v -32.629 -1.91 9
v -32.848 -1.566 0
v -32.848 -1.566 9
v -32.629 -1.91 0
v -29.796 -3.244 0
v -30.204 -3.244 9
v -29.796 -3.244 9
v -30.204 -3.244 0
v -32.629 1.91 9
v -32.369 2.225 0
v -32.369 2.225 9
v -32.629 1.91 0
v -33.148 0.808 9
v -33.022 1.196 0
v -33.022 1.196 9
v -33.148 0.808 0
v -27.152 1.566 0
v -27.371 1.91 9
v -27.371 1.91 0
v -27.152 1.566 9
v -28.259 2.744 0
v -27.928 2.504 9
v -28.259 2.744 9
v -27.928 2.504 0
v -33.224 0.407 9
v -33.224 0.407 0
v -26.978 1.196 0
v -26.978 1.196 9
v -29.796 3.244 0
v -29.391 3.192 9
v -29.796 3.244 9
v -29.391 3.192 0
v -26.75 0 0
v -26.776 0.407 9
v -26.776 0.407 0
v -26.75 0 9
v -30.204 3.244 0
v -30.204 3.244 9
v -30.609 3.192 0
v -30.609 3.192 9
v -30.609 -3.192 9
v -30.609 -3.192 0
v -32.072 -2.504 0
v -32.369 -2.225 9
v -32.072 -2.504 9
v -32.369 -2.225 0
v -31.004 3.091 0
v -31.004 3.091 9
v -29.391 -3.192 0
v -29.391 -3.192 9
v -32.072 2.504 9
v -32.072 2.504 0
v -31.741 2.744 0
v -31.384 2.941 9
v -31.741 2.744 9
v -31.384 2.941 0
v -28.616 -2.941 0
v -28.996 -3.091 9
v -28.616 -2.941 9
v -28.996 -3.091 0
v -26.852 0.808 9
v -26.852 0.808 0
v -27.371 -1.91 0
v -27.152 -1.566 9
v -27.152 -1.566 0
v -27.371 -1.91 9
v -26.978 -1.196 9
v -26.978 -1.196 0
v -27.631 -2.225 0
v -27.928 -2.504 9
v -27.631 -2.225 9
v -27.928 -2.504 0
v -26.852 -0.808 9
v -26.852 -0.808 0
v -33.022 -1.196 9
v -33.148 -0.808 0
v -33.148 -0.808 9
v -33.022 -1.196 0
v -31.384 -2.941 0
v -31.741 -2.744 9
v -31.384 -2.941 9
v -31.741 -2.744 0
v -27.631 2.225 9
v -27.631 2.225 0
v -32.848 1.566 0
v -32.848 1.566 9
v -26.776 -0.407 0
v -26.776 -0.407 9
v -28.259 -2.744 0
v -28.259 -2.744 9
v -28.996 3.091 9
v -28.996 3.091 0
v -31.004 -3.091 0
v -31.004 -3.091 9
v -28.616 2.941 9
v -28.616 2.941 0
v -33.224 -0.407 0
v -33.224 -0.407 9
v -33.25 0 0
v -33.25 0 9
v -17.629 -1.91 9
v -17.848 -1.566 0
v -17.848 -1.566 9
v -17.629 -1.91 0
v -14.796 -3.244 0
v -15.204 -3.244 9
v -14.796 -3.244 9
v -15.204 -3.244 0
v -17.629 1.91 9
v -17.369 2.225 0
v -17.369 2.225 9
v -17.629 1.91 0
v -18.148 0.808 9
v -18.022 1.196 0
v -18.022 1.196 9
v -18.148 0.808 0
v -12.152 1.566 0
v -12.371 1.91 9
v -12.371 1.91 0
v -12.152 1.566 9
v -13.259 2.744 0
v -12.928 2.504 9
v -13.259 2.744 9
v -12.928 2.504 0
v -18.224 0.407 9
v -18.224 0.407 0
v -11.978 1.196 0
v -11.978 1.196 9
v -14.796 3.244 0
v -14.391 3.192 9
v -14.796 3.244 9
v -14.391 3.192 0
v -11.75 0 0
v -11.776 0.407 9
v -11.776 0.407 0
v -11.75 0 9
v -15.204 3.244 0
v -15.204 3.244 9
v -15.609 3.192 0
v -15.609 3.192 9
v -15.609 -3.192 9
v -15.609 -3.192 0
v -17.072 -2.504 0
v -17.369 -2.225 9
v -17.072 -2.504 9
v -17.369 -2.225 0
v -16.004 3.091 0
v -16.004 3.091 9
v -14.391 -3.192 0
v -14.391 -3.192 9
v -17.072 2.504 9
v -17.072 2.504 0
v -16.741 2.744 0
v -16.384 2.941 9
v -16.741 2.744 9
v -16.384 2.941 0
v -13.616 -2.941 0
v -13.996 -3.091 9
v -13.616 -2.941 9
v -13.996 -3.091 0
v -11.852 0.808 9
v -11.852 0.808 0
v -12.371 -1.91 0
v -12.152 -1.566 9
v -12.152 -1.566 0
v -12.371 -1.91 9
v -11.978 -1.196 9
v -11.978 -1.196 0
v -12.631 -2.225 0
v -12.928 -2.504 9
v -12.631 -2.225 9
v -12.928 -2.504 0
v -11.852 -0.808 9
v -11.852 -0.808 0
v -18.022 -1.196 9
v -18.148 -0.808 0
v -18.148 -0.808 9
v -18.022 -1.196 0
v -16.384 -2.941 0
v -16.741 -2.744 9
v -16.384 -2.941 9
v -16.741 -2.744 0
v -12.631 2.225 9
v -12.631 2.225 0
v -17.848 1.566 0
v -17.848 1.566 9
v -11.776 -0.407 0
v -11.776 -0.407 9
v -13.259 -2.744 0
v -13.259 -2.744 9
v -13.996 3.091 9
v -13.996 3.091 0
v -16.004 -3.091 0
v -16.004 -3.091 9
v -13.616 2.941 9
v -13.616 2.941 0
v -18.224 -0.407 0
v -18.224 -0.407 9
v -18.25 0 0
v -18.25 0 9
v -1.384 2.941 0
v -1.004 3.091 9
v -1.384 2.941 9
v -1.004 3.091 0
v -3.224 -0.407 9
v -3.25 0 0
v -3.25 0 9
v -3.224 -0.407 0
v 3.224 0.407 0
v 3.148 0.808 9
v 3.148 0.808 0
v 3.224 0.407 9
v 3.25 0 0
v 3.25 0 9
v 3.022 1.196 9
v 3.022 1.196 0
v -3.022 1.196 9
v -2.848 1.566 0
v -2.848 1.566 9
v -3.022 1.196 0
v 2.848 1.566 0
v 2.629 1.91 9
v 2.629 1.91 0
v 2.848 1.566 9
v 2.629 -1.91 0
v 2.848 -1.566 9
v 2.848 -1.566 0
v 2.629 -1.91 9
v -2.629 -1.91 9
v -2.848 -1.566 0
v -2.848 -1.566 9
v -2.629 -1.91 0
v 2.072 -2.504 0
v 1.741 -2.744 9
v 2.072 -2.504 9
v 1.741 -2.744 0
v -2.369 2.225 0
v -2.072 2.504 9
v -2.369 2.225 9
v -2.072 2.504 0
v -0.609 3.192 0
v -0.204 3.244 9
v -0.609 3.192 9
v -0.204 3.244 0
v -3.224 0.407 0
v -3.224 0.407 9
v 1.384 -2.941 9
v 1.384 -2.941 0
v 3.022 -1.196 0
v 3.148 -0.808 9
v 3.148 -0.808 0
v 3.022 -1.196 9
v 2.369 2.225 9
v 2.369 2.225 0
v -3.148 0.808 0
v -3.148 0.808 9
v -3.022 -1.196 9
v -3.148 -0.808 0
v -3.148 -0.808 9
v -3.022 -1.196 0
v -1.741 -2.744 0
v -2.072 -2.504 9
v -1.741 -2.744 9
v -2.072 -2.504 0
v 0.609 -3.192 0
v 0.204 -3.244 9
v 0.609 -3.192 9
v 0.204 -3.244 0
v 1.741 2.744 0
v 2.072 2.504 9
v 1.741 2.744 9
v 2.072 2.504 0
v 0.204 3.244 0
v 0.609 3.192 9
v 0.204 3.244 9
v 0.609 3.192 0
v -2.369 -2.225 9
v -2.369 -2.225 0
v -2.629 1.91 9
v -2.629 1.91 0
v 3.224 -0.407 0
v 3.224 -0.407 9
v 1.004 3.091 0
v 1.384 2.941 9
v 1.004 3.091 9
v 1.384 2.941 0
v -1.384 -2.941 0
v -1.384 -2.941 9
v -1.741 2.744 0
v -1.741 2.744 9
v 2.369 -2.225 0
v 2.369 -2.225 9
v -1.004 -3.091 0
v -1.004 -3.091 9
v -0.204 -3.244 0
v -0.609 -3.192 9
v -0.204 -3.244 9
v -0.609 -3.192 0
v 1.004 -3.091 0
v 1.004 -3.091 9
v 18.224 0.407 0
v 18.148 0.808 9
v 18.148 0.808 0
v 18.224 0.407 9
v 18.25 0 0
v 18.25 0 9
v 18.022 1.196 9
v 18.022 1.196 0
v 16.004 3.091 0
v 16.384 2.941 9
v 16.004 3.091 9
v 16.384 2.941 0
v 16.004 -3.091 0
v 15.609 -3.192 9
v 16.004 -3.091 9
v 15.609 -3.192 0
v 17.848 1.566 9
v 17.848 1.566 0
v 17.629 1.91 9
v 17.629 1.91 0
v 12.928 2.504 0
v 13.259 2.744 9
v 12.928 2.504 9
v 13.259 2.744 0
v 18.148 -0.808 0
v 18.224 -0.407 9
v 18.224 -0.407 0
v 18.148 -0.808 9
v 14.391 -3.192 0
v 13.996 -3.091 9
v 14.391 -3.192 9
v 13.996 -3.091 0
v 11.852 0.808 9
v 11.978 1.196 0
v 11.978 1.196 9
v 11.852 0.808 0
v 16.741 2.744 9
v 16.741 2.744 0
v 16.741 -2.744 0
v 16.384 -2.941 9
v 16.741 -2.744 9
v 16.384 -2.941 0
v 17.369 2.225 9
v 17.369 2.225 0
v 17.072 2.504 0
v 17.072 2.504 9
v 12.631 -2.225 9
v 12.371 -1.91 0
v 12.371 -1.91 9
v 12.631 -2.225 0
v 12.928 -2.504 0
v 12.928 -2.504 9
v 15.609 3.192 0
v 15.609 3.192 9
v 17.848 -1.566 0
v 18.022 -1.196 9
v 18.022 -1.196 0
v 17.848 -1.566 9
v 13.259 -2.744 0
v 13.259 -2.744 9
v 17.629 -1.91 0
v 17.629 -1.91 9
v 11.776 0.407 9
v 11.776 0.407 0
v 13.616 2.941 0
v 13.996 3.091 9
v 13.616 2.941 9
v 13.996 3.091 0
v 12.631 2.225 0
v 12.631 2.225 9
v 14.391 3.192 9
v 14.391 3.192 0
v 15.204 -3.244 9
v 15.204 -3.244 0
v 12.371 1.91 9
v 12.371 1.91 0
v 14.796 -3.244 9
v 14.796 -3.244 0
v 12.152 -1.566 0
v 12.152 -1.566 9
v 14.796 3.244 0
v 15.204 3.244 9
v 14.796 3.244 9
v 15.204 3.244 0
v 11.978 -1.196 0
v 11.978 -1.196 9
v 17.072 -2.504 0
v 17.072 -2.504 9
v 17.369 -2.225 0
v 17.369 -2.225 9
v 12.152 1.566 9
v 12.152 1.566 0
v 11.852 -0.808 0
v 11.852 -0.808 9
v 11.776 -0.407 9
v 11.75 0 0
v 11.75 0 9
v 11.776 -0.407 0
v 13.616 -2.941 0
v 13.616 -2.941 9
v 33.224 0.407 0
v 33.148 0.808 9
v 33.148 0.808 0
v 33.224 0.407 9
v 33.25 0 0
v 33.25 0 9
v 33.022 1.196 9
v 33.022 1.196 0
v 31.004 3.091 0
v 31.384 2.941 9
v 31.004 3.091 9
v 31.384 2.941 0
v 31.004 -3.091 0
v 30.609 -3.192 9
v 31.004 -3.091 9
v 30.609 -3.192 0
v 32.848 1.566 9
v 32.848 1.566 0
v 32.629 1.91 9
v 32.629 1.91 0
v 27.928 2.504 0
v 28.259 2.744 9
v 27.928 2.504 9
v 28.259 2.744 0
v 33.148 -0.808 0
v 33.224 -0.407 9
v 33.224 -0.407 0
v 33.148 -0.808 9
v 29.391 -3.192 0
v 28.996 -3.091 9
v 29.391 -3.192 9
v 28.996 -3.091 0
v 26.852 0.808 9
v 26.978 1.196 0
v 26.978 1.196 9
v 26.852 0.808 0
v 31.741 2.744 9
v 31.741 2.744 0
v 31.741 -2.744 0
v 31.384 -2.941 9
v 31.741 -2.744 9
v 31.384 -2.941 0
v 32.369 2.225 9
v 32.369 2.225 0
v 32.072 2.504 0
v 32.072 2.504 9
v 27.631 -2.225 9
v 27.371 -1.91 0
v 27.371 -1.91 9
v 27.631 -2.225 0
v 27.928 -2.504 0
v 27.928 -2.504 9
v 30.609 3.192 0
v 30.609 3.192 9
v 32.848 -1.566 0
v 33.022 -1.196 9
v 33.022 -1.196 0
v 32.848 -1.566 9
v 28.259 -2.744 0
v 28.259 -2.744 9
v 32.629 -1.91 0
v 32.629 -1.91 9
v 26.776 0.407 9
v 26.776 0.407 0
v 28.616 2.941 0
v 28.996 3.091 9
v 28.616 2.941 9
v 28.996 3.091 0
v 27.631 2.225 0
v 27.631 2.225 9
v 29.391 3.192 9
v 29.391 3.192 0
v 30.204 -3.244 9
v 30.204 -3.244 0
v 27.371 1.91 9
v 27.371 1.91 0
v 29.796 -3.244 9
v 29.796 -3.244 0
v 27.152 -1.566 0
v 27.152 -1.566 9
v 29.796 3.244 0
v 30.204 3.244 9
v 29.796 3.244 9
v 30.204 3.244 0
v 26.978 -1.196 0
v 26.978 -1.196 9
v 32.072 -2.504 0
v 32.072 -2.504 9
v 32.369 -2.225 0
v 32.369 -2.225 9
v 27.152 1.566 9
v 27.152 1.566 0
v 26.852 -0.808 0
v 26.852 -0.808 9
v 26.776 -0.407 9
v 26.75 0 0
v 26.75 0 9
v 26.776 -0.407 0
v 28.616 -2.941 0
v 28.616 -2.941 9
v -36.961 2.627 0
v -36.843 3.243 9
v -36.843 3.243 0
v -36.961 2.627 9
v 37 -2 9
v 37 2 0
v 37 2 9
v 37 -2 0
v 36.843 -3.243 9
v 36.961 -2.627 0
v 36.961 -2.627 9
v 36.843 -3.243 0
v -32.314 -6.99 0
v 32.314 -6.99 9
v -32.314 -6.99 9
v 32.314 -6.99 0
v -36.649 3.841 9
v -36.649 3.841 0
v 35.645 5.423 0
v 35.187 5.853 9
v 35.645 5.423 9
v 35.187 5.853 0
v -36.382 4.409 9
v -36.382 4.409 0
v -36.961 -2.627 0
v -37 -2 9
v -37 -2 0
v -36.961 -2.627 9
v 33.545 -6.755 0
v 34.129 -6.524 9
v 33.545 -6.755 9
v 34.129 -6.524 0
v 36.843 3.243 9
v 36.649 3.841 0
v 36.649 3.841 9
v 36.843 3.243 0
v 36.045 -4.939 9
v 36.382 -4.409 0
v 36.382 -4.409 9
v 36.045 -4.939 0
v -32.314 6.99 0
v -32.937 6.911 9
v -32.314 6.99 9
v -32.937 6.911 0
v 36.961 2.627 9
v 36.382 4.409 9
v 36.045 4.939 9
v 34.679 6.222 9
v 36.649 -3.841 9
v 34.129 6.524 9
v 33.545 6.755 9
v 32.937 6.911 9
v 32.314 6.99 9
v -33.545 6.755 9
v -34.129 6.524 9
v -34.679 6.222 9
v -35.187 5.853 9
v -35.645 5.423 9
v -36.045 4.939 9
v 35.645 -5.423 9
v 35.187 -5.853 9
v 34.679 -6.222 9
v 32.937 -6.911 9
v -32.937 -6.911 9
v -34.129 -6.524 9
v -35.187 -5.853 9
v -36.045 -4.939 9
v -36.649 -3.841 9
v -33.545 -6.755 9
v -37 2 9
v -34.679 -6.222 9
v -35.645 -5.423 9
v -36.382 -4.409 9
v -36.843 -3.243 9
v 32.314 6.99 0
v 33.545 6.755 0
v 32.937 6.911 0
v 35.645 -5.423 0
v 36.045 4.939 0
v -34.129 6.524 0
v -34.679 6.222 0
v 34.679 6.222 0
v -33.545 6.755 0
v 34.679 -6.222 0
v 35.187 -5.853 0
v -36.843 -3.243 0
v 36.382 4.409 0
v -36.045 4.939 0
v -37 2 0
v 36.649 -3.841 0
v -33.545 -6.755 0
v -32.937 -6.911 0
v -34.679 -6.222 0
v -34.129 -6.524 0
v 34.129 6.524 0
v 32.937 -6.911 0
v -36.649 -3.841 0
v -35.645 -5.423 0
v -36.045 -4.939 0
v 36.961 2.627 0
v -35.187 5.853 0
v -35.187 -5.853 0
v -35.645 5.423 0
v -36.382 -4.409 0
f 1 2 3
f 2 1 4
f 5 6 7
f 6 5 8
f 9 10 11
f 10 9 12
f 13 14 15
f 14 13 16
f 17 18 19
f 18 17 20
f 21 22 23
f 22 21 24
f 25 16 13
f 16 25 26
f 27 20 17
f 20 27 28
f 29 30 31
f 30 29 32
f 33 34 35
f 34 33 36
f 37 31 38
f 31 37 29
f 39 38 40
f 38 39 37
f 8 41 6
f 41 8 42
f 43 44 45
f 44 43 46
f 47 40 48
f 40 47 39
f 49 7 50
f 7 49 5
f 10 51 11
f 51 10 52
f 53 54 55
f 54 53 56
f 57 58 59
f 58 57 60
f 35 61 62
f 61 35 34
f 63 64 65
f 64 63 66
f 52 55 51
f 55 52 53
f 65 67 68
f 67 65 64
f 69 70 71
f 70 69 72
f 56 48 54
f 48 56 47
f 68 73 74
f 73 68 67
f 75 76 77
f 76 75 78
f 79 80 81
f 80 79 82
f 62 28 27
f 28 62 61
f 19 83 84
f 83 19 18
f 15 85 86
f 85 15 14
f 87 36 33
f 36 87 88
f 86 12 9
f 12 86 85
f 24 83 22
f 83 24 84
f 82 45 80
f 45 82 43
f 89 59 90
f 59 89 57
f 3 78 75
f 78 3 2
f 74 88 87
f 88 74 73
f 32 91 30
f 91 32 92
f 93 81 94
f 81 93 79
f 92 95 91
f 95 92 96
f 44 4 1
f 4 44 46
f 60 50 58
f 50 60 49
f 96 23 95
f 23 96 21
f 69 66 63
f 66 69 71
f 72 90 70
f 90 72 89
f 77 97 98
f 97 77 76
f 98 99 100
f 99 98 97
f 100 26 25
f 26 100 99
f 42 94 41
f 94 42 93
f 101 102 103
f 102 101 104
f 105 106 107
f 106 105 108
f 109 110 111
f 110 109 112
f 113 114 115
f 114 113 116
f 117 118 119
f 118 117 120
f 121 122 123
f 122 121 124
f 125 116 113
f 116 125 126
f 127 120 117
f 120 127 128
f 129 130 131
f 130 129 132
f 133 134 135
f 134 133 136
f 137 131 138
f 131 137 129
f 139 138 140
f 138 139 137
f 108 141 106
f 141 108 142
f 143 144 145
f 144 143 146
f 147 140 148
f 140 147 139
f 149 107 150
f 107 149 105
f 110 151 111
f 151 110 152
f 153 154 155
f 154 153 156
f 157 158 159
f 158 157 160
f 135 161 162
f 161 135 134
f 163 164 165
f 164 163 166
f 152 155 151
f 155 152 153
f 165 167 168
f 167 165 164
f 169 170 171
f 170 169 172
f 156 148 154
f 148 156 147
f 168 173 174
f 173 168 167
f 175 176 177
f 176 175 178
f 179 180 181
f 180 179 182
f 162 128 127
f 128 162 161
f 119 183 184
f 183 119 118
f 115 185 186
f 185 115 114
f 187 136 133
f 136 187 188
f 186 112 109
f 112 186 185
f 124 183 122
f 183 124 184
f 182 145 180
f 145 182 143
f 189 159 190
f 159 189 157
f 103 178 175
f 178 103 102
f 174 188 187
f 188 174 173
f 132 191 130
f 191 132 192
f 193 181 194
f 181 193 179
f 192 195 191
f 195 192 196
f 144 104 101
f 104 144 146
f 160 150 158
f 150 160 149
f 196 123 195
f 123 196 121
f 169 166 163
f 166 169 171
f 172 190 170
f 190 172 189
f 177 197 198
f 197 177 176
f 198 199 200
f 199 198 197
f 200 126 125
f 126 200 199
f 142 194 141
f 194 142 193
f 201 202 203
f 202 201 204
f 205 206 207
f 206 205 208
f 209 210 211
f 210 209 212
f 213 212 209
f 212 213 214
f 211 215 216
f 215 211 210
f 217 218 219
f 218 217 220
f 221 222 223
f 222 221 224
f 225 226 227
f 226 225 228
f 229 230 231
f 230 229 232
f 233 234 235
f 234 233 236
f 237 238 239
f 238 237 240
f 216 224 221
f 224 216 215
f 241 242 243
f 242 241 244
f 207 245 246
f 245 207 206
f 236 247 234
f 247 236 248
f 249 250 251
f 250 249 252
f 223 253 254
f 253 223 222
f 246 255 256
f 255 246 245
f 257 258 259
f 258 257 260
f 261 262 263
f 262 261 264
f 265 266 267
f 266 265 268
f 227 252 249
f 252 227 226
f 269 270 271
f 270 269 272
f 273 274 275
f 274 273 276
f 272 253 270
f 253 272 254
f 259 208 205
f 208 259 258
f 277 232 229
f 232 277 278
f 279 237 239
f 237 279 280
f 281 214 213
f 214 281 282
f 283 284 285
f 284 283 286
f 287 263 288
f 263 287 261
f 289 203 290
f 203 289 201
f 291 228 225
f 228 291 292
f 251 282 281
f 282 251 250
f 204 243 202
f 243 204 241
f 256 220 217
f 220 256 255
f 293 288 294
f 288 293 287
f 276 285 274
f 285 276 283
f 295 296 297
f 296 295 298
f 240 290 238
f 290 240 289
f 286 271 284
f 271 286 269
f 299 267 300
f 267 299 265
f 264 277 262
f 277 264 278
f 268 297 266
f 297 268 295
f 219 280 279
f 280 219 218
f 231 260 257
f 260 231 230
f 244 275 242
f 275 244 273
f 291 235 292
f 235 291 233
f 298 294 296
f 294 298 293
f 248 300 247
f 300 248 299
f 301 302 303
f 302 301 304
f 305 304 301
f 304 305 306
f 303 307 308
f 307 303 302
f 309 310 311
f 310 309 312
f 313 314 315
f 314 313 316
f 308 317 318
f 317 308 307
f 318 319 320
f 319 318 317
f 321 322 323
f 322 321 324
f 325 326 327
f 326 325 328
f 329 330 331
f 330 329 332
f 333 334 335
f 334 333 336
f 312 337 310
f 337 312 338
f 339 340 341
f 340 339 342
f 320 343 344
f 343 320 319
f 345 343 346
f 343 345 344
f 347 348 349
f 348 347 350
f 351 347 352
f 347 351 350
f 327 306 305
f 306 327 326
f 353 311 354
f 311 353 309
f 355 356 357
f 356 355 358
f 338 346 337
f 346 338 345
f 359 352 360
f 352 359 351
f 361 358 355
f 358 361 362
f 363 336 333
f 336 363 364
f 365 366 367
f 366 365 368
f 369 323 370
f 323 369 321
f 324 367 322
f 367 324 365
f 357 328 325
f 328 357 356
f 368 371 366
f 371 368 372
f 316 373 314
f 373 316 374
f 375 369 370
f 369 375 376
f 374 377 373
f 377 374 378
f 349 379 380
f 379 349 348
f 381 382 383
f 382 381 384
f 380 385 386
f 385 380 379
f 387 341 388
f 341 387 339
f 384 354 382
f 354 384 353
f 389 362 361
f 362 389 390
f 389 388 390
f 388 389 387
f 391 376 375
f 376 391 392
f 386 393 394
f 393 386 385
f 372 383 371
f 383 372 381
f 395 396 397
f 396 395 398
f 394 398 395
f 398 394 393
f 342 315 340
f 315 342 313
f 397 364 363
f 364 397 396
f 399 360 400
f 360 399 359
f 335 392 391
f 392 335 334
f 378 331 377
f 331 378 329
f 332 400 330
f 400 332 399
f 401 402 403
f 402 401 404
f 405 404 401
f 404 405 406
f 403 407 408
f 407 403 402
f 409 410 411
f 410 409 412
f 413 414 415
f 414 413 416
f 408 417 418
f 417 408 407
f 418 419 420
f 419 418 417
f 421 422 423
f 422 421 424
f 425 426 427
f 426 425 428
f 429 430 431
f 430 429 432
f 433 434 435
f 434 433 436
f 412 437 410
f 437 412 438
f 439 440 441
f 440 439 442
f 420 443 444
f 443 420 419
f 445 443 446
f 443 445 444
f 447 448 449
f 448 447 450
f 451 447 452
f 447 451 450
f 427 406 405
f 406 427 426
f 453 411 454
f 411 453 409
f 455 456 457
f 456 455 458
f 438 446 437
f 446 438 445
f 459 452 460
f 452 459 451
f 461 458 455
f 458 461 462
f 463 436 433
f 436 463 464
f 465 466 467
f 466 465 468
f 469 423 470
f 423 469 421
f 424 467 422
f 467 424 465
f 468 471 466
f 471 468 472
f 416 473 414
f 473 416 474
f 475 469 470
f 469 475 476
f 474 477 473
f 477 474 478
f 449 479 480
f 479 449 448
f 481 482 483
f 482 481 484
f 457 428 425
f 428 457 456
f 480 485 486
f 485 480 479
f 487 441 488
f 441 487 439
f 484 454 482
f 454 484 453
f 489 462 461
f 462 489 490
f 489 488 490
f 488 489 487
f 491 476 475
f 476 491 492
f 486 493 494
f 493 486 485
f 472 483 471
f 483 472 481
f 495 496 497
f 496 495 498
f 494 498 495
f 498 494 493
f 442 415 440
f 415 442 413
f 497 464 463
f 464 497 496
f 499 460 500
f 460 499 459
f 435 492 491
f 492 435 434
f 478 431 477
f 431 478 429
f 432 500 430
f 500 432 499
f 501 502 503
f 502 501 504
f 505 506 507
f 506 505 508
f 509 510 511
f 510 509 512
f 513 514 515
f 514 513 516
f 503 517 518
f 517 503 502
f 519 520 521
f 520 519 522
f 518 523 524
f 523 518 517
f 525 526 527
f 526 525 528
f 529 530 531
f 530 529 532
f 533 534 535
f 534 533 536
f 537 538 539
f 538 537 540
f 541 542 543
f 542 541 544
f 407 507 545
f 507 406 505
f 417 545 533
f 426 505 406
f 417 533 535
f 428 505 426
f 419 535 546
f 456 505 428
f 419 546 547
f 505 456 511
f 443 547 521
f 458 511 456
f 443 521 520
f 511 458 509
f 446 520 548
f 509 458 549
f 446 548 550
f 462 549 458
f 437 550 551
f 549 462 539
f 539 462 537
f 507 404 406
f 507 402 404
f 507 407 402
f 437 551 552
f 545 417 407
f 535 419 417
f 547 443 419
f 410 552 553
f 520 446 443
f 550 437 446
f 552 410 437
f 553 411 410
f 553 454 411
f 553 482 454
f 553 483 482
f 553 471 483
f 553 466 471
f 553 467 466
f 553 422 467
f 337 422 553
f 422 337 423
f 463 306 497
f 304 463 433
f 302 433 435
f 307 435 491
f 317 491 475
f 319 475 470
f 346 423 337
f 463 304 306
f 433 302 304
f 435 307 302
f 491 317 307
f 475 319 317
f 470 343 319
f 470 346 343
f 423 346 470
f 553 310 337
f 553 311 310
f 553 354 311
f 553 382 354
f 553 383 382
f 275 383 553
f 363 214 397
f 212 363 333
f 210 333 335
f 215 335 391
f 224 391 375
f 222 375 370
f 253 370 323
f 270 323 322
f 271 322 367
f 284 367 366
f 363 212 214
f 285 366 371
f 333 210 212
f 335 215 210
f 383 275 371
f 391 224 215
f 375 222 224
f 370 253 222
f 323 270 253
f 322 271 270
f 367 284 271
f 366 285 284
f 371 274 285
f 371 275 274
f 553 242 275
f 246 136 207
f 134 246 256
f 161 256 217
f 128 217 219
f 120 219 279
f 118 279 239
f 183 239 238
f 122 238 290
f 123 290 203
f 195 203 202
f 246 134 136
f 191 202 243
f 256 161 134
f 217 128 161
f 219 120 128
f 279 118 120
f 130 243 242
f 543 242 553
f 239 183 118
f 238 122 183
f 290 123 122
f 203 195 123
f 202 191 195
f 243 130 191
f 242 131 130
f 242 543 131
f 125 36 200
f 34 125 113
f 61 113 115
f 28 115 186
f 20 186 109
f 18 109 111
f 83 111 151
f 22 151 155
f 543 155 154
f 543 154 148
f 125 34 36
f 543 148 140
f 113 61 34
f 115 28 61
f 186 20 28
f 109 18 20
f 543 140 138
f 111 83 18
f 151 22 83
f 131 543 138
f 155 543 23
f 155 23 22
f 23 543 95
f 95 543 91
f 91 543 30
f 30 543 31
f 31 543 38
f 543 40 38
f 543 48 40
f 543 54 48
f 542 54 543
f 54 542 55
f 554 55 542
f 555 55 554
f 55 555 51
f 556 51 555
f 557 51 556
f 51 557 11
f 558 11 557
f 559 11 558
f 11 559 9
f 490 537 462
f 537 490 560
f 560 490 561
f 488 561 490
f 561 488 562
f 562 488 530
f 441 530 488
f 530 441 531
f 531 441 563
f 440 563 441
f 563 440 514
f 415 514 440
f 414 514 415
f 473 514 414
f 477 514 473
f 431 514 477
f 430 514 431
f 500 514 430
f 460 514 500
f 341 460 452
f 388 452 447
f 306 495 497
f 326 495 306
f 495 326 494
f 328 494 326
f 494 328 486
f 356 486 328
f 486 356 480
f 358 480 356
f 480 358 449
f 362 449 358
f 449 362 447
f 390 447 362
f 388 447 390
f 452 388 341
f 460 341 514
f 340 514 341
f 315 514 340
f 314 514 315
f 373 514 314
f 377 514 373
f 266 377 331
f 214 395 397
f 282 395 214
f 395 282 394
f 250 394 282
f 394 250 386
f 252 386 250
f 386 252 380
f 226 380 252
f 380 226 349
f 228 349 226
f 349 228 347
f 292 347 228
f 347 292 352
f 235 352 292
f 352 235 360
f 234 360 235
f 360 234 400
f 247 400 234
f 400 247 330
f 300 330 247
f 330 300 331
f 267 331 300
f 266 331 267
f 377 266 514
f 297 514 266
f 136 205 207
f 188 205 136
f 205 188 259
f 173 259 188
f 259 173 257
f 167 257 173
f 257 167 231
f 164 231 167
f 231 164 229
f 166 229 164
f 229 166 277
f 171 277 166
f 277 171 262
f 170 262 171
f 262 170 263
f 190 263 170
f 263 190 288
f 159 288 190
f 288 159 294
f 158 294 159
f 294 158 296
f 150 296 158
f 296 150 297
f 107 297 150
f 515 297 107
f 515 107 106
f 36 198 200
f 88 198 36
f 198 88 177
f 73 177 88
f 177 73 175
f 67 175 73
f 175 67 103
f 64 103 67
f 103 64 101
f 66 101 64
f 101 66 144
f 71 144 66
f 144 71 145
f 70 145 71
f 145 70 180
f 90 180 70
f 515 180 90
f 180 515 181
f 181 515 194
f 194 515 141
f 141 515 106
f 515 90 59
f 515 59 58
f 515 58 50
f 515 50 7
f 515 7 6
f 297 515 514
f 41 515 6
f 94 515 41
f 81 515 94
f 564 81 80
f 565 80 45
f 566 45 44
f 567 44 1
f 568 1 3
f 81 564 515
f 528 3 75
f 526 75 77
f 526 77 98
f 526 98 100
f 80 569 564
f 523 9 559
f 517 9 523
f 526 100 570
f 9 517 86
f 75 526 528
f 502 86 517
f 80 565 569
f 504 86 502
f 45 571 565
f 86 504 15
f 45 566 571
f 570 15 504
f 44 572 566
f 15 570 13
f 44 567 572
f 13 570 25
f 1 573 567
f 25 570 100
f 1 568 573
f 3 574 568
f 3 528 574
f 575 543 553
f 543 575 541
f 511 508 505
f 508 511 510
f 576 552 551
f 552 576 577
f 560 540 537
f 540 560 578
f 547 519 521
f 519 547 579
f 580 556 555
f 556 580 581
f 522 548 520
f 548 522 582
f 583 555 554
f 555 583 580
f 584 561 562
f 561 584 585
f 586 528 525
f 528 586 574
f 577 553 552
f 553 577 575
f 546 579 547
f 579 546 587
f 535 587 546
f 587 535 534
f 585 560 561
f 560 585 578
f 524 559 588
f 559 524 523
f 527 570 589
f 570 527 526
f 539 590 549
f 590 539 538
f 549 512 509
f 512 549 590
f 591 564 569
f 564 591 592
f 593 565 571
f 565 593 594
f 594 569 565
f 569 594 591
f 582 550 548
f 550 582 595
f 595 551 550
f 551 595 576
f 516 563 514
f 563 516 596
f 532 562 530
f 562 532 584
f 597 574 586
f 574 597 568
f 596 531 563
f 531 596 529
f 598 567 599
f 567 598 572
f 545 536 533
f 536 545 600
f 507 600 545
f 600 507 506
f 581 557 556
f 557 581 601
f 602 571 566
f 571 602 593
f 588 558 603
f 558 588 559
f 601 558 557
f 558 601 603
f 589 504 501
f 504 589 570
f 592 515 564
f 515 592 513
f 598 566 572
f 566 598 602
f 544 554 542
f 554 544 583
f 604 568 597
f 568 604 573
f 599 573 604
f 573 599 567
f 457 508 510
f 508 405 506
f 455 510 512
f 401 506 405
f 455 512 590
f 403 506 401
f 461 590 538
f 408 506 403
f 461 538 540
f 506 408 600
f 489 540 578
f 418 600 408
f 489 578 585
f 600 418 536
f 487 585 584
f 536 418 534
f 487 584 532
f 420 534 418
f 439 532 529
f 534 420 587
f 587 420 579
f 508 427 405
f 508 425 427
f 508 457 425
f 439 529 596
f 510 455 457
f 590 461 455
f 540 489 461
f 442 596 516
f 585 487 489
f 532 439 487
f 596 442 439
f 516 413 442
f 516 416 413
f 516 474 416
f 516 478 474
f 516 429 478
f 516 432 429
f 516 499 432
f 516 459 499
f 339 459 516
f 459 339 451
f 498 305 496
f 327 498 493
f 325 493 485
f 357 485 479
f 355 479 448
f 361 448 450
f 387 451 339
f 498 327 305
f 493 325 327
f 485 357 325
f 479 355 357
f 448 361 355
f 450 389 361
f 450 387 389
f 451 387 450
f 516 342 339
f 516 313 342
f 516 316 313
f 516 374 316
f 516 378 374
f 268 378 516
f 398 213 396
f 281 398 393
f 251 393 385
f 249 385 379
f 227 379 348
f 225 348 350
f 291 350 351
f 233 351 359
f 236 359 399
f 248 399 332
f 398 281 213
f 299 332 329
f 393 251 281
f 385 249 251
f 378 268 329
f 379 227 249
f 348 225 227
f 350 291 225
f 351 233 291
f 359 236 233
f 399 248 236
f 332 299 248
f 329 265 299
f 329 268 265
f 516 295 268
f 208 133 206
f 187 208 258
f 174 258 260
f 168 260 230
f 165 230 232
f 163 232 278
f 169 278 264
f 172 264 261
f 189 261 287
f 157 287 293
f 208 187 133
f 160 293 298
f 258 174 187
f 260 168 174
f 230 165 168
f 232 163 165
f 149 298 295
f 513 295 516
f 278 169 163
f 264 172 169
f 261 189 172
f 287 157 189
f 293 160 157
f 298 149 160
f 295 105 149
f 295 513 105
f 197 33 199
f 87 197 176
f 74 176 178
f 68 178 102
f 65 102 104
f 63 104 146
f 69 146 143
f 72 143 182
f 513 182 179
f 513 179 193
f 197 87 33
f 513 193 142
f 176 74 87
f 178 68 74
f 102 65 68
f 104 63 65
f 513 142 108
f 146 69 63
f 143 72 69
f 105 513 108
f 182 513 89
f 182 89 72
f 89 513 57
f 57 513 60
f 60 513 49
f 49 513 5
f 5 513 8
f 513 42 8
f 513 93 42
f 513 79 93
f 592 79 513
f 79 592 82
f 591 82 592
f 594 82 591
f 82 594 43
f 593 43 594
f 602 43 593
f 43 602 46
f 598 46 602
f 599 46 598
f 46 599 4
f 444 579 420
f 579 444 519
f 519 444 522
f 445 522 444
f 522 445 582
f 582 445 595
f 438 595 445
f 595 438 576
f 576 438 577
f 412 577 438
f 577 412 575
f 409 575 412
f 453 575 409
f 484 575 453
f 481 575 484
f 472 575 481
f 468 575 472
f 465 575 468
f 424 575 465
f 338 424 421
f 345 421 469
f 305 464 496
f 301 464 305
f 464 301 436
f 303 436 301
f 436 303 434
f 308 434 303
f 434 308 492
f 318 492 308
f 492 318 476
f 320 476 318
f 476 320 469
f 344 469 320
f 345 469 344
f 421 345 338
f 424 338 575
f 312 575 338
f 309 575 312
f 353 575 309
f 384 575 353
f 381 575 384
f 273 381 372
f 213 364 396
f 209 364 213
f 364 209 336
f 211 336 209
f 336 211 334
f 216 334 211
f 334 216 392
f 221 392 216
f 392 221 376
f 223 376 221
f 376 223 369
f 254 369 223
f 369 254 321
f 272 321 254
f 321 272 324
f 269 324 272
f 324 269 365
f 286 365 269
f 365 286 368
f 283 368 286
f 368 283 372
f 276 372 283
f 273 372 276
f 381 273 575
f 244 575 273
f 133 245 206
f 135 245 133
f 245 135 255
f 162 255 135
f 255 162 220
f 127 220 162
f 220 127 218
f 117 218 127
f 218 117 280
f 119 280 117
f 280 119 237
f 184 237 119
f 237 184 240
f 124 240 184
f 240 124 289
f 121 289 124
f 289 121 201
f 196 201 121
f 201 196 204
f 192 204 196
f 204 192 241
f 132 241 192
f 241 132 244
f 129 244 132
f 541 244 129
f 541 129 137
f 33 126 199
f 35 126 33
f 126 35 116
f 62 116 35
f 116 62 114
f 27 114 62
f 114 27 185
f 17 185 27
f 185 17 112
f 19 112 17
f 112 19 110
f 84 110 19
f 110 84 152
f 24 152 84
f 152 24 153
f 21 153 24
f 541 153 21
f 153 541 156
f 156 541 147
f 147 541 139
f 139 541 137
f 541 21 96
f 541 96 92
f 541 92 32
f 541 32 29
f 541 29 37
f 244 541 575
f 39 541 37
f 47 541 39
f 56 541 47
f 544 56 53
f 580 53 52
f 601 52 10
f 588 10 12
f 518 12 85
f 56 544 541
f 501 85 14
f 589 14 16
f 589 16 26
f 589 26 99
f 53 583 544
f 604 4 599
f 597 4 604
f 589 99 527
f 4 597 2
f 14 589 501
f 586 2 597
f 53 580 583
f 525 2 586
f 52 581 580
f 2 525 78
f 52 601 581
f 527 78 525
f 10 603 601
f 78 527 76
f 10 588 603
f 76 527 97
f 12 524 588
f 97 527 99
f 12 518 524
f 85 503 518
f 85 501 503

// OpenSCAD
$fn = 50;


difference() {
	union() {
		hull() {
			translate(v = [-32.0000000000, 2.0000000000, 0]) {
				cylinder(h = 9, r = 5);
			}
			translate(v = [32.0000000000, 2.0000000000, 0]) {
				cylinder(h = 9, r = 5);
			}
			translate(v = [-32.0000000000, -2.0000000000, 0]) {
				cylinder(h = 9, r = 5);
			}
			translate(v = [32.0000000000, -2.0000000000, 0]) {
				cylinder(h = 9, r = 5);
			}
		}
	}
	union() {
		translate(v = [-30.0000000000, 0.0000000000, -100.0000000000]) {
			cylinder(h = 200, r = 3.2500000000);
		}
		translate(v = [-15.0000000000, 0.0000000000, -100.0000000000]) {
			cylinder(h = 200, r = 3.2500000000);
		}
		translate(v = [0.0000000000, 0.0000000000, -100.0000000000]) {
			cylinder(h = 200, r = 3.2500000000);
		}
		translate(v = [15.0000000000, 0.0000000000, -100.0000000000]) {
			cylinder(h = 200, r = 3.2500000000);
		}
		translate(v = [30.0000000000, 0.0000000000, -100.0000000000]) {
			cylinder(h = 200, r = 3.2500000000);
		}
	}
}
